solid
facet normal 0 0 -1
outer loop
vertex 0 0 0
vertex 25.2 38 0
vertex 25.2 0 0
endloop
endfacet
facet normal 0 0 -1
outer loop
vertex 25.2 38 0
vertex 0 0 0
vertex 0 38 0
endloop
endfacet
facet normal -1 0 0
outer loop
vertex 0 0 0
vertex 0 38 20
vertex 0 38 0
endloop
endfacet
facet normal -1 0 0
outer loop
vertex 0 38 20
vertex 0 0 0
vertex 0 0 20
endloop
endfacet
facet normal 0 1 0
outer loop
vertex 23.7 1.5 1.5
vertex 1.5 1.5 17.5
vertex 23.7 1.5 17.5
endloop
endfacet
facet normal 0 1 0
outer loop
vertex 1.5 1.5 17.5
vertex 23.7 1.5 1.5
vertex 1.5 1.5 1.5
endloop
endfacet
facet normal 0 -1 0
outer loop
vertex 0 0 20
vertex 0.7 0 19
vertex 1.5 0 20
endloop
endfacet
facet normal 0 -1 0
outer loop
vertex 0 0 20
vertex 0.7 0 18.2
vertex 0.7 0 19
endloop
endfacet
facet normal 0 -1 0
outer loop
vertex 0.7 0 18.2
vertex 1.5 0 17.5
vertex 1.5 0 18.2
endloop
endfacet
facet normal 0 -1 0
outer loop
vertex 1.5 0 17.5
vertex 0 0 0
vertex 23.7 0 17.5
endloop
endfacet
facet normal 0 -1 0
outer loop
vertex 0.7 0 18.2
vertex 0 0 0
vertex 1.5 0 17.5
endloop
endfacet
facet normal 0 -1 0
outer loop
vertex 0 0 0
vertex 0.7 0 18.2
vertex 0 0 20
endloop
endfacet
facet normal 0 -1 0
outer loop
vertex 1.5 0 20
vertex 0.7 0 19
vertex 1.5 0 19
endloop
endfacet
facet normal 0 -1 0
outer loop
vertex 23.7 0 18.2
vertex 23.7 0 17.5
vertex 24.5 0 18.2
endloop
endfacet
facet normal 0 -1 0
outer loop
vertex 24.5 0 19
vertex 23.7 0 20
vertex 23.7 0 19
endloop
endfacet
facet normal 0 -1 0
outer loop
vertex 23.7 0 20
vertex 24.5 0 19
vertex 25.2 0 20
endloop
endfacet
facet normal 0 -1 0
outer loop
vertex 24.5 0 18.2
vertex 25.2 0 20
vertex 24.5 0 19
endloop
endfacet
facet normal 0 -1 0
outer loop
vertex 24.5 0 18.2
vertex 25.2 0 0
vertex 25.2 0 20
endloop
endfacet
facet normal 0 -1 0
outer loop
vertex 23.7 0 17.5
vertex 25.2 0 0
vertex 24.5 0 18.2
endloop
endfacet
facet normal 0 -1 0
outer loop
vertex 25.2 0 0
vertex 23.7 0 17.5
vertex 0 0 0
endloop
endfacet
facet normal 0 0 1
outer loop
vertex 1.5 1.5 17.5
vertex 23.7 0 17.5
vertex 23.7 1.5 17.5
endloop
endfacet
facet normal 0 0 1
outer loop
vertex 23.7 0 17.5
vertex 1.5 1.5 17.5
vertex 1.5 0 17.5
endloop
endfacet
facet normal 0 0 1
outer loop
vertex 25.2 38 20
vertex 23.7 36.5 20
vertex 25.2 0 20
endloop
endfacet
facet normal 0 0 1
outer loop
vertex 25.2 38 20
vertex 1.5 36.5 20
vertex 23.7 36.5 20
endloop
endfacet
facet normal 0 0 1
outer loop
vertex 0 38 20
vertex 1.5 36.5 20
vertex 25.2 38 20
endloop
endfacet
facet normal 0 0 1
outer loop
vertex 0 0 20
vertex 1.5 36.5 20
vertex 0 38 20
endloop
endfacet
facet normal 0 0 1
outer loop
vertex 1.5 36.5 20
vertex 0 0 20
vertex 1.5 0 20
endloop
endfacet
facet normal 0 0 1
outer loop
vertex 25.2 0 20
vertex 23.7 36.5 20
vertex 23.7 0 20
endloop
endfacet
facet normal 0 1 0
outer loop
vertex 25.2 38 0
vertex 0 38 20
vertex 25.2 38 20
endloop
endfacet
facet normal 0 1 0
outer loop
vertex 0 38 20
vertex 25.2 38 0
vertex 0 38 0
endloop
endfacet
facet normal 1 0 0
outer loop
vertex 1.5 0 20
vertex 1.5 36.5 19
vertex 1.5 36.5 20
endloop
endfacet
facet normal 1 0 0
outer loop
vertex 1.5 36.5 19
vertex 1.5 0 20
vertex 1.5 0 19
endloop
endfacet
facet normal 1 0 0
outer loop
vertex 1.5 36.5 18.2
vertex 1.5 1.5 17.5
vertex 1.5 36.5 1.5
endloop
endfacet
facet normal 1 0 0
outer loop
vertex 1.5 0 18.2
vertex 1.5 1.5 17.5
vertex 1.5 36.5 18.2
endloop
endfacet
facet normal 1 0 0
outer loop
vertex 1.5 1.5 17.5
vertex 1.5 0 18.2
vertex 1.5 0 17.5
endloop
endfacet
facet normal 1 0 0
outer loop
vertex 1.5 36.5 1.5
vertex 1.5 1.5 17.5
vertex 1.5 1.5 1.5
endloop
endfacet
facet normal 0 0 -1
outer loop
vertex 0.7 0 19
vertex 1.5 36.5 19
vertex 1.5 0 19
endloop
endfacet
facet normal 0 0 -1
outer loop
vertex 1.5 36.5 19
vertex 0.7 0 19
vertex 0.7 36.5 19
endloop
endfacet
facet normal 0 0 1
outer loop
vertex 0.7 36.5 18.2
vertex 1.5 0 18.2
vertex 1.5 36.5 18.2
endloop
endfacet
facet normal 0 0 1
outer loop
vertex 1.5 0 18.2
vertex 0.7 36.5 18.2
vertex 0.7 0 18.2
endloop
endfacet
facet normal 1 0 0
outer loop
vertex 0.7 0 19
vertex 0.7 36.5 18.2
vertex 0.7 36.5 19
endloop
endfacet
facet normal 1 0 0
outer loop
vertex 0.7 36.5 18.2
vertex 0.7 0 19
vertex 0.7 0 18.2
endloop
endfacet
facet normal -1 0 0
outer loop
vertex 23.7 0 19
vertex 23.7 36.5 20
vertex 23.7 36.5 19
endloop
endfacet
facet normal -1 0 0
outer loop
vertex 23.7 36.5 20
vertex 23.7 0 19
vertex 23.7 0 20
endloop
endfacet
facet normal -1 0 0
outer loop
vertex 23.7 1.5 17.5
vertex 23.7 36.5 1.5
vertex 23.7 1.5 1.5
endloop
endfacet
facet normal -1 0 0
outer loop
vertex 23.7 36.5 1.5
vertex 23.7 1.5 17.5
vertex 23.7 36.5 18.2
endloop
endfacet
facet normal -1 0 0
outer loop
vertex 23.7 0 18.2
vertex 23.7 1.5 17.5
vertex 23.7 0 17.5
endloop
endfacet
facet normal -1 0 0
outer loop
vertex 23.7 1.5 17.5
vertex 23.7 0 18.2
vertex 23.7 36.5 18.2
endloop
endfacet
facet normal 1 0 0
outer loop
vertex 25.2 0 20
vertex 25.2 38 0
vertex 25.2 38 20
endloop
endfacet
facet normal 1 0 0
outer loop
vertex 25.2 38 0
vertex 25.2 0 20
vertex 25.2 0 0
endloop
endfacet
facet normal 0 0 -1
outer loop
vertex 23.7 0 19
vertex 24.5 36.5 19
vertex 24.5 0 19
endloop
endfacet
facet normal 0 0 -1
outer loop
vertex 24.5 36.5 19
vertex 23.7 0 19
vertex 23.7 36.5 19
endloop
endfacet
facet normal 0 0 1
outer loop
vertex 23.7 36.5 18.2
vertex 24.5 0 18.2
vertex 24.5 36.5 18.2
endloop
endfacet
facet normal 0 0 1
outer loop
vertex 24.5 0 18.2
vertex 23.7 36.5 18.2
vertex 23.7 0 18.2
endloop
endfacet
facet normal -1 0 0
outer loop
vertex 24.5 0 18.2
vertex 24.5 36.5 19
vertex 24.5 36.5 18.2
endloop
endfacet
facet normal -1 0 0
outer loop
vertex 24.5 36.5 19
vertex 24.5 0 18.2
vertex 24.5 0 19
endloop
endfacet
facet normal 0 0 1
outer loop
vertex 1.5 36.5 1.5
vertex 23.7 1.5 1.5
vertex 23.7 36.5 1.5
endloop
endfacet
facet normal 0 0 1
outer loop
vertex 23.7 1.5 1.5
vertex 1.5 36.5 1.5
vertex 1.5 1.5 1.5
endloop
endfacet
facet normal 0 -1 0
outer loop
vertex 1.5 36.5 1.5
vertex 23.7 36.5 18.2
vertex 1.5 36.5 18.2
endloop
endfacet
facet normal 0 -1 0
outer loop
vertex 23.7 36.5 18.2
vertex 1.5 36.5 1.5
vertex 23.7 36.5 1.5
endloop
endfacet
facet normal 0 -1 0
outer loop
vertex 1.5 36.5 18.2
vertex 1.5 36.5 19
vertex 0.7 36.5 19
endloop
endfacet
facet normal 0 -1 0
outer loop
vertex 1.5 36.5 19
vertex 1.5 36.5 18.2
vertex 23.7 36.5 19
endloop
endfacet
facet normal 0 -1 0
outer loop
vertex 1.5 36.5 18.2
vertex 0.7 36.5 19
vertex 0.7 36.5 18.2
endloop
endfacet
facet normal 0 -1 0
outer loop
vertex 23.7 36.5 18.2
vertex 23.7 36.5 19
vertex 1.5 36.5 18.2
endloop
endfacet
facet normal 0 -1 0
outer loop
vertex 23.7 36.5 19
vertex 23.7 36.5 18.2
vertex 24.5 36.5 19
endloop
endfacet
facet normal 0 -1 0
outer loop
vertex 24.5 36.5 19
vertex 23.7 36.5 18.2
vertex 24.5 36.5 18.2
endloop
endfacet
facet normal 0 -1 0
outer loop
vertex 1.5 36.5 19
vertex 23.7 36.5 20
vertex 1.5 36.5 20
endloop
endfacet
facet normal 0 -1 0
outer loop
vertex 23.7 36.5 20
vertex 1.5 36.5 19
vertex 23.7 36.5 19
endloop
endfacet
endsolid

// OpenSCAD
l=35;
w=22.2;
h=18.5;
t=1.5;

slot=0.8;
trim=2.5;

module cutout(x,z,len,height)
{
    translate([x+t,-t,z+t]){
        cube([len,3*t,height]);
    }
}

// Bottom
cube([w+2*t,l+2*t,t]);


// Front
translate([0,0,0]){
    rotate([0,0,0]){ 
        difference(){
           cube([w+2*t,t,h+t]);
            
           translate([0,-t,h+t-trim]){
               cube([w*2*t,3*t,trim]);
           }
           //cutout(5,0,15,6);
        }
    }
}

// Back
translate([w+2*t,l+2*t,0]){
    rotate([0,0,180]){
        difference(){
           cube([w+2*t,t,h+t]);
            
            //cutout(0,0,2,2);
        }
    }
}

// Left
translate([0,l+2*t,0]){
    rotate([0,0,-90]){ 
        difference() {
           cube([l+2*t,t,h+t]);
           translate([0,t-slot,h+t-slot-1]){
               cube([l+2*t,slot+.2,slot]);
           }
            //cutout(40,0,25,6);
        }
    }
}

// Right
translate([w+2*t,0,0]){
    rotate([0,0,90]){
        difference(){ 
           cube([l+2*t,t,h+t]);
            
            translate([0,t-slot,h+t-slot-1]){
               cube([l+2*t,slot+0.2,slot]);
           }
            //cutout(5,0,15,6);
            //cutout(35,0,25,6);
            
        }
    }
}
